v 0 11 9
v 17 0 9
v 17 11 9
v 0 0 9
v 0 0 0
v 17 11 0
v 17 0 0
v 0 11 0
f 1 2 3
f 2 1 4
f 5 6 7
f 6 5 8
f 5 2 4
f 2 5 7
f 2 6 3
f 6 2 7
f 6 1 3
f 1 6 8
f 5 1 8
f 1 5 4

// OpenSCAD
// Generated by SolidPython 1.0.1 on 2020-07-29 00:46:56


cube(size = [17, 11, 9]);
/***********************************************
*********      SolidPython code:      **********
************************************************
 
# import packages: SolidPython
from solid import *
from solid.utils import *
from itertools import chain, combinations, permutations


class Resize:

    def __init__(self, scad_file):
        self.scad_file = scad_file
        #self.scad_file = import_scad(scad_file)
        # cone/cylinder param:
        self.r1 = 0
        self.r2 = 0
        self.h = 0
        # rectangular prism param:
        self.w = 0
        self.l = 0
        # ellipse param:
        self.r = 0

    # import OpenScad code (file name corresponds to shape)


    # classify shape + parameters
    def assign(self, param1, param2, param3):
        if self.scad_file == 'cone.scad':
            self.r1 = param1
            self.r2 = param2
            self.h = param3
        elif self.scad_file == 'cylinder.scad':
            self.r1 = param1
            self.r2 = param2
            self.h = param3
        elif self.scad_file == 'rectangularPrism.scad':
            self.h = param1
            self.l = param2
            self.w = param3
        else:
            self.r = param1
            self.h = param2

    # resize parameters
    def iterate(self):
        x = range(3, 20, 2)
        i = 1
        if self.scad_file == 'cone.scad':
            tempList = list(permutations(x, 2))
            for temp in tempList:
                param1 = temp[0]
                param2 = temp[1]
                filepath = 'produced_scad_files/' + 'cone' + str(param1) + '_' + str(param2) + '_' + '.scad'
                scad_render_to_file(cylinder(h=param1, r1=param2, r2=0), filepath)

        elif self.scad_file == 'cylinder.scad':
            tempList = list(permutations(x, 3))
            for temp in tempList:
                param1 = temp[0]
                param2 = temp[1]
                filepath = 'produced_scad_files/' + 'cylinder' + str(param1) + '_' + str(param2) + '_' + '.scad'
                scad_render_to_file(cylinder(h=param1, r1=param2, r2=param2), filepath)

        elif self.scad_file == 'rectangularPrism.scad':
            tempList = list(permutations(x, 3))
            for temp in tempList:
                param1 = temp[0]
                param2 = temp[1]
                param3 = temp[2]
                filepath = 'produced_scad_files/' + 'rectangularPrism' + str(param1) + '_' + str(param2) + '_' + str(
                    param3) + '.scad'
                scad_render_to_file(cube(size=(param1, param2, param3)), filepath)

        elif self.scad_file == 'ellipse.scad':
            tempList = list(permutations(x, 4))
            for temp in tempList:
                param1 = temp[0]
                param2 = temp[1]
                param3 = temp[2]
                param4 = temp[3]
                filepath = 'produced_scad_files/' + 'ellipse' + str(param1) + '_' + str(param2) + '_' + str(param3) + '_' + str(param4) + '.scad'
                scad_render_to_file(scale([param1, param2, param3])(sphere(r=param4)), filepath)

    def render_to_scadfile(self):
        scad_render_to_file(scad, 'example.scad') 
 
************************************************/
